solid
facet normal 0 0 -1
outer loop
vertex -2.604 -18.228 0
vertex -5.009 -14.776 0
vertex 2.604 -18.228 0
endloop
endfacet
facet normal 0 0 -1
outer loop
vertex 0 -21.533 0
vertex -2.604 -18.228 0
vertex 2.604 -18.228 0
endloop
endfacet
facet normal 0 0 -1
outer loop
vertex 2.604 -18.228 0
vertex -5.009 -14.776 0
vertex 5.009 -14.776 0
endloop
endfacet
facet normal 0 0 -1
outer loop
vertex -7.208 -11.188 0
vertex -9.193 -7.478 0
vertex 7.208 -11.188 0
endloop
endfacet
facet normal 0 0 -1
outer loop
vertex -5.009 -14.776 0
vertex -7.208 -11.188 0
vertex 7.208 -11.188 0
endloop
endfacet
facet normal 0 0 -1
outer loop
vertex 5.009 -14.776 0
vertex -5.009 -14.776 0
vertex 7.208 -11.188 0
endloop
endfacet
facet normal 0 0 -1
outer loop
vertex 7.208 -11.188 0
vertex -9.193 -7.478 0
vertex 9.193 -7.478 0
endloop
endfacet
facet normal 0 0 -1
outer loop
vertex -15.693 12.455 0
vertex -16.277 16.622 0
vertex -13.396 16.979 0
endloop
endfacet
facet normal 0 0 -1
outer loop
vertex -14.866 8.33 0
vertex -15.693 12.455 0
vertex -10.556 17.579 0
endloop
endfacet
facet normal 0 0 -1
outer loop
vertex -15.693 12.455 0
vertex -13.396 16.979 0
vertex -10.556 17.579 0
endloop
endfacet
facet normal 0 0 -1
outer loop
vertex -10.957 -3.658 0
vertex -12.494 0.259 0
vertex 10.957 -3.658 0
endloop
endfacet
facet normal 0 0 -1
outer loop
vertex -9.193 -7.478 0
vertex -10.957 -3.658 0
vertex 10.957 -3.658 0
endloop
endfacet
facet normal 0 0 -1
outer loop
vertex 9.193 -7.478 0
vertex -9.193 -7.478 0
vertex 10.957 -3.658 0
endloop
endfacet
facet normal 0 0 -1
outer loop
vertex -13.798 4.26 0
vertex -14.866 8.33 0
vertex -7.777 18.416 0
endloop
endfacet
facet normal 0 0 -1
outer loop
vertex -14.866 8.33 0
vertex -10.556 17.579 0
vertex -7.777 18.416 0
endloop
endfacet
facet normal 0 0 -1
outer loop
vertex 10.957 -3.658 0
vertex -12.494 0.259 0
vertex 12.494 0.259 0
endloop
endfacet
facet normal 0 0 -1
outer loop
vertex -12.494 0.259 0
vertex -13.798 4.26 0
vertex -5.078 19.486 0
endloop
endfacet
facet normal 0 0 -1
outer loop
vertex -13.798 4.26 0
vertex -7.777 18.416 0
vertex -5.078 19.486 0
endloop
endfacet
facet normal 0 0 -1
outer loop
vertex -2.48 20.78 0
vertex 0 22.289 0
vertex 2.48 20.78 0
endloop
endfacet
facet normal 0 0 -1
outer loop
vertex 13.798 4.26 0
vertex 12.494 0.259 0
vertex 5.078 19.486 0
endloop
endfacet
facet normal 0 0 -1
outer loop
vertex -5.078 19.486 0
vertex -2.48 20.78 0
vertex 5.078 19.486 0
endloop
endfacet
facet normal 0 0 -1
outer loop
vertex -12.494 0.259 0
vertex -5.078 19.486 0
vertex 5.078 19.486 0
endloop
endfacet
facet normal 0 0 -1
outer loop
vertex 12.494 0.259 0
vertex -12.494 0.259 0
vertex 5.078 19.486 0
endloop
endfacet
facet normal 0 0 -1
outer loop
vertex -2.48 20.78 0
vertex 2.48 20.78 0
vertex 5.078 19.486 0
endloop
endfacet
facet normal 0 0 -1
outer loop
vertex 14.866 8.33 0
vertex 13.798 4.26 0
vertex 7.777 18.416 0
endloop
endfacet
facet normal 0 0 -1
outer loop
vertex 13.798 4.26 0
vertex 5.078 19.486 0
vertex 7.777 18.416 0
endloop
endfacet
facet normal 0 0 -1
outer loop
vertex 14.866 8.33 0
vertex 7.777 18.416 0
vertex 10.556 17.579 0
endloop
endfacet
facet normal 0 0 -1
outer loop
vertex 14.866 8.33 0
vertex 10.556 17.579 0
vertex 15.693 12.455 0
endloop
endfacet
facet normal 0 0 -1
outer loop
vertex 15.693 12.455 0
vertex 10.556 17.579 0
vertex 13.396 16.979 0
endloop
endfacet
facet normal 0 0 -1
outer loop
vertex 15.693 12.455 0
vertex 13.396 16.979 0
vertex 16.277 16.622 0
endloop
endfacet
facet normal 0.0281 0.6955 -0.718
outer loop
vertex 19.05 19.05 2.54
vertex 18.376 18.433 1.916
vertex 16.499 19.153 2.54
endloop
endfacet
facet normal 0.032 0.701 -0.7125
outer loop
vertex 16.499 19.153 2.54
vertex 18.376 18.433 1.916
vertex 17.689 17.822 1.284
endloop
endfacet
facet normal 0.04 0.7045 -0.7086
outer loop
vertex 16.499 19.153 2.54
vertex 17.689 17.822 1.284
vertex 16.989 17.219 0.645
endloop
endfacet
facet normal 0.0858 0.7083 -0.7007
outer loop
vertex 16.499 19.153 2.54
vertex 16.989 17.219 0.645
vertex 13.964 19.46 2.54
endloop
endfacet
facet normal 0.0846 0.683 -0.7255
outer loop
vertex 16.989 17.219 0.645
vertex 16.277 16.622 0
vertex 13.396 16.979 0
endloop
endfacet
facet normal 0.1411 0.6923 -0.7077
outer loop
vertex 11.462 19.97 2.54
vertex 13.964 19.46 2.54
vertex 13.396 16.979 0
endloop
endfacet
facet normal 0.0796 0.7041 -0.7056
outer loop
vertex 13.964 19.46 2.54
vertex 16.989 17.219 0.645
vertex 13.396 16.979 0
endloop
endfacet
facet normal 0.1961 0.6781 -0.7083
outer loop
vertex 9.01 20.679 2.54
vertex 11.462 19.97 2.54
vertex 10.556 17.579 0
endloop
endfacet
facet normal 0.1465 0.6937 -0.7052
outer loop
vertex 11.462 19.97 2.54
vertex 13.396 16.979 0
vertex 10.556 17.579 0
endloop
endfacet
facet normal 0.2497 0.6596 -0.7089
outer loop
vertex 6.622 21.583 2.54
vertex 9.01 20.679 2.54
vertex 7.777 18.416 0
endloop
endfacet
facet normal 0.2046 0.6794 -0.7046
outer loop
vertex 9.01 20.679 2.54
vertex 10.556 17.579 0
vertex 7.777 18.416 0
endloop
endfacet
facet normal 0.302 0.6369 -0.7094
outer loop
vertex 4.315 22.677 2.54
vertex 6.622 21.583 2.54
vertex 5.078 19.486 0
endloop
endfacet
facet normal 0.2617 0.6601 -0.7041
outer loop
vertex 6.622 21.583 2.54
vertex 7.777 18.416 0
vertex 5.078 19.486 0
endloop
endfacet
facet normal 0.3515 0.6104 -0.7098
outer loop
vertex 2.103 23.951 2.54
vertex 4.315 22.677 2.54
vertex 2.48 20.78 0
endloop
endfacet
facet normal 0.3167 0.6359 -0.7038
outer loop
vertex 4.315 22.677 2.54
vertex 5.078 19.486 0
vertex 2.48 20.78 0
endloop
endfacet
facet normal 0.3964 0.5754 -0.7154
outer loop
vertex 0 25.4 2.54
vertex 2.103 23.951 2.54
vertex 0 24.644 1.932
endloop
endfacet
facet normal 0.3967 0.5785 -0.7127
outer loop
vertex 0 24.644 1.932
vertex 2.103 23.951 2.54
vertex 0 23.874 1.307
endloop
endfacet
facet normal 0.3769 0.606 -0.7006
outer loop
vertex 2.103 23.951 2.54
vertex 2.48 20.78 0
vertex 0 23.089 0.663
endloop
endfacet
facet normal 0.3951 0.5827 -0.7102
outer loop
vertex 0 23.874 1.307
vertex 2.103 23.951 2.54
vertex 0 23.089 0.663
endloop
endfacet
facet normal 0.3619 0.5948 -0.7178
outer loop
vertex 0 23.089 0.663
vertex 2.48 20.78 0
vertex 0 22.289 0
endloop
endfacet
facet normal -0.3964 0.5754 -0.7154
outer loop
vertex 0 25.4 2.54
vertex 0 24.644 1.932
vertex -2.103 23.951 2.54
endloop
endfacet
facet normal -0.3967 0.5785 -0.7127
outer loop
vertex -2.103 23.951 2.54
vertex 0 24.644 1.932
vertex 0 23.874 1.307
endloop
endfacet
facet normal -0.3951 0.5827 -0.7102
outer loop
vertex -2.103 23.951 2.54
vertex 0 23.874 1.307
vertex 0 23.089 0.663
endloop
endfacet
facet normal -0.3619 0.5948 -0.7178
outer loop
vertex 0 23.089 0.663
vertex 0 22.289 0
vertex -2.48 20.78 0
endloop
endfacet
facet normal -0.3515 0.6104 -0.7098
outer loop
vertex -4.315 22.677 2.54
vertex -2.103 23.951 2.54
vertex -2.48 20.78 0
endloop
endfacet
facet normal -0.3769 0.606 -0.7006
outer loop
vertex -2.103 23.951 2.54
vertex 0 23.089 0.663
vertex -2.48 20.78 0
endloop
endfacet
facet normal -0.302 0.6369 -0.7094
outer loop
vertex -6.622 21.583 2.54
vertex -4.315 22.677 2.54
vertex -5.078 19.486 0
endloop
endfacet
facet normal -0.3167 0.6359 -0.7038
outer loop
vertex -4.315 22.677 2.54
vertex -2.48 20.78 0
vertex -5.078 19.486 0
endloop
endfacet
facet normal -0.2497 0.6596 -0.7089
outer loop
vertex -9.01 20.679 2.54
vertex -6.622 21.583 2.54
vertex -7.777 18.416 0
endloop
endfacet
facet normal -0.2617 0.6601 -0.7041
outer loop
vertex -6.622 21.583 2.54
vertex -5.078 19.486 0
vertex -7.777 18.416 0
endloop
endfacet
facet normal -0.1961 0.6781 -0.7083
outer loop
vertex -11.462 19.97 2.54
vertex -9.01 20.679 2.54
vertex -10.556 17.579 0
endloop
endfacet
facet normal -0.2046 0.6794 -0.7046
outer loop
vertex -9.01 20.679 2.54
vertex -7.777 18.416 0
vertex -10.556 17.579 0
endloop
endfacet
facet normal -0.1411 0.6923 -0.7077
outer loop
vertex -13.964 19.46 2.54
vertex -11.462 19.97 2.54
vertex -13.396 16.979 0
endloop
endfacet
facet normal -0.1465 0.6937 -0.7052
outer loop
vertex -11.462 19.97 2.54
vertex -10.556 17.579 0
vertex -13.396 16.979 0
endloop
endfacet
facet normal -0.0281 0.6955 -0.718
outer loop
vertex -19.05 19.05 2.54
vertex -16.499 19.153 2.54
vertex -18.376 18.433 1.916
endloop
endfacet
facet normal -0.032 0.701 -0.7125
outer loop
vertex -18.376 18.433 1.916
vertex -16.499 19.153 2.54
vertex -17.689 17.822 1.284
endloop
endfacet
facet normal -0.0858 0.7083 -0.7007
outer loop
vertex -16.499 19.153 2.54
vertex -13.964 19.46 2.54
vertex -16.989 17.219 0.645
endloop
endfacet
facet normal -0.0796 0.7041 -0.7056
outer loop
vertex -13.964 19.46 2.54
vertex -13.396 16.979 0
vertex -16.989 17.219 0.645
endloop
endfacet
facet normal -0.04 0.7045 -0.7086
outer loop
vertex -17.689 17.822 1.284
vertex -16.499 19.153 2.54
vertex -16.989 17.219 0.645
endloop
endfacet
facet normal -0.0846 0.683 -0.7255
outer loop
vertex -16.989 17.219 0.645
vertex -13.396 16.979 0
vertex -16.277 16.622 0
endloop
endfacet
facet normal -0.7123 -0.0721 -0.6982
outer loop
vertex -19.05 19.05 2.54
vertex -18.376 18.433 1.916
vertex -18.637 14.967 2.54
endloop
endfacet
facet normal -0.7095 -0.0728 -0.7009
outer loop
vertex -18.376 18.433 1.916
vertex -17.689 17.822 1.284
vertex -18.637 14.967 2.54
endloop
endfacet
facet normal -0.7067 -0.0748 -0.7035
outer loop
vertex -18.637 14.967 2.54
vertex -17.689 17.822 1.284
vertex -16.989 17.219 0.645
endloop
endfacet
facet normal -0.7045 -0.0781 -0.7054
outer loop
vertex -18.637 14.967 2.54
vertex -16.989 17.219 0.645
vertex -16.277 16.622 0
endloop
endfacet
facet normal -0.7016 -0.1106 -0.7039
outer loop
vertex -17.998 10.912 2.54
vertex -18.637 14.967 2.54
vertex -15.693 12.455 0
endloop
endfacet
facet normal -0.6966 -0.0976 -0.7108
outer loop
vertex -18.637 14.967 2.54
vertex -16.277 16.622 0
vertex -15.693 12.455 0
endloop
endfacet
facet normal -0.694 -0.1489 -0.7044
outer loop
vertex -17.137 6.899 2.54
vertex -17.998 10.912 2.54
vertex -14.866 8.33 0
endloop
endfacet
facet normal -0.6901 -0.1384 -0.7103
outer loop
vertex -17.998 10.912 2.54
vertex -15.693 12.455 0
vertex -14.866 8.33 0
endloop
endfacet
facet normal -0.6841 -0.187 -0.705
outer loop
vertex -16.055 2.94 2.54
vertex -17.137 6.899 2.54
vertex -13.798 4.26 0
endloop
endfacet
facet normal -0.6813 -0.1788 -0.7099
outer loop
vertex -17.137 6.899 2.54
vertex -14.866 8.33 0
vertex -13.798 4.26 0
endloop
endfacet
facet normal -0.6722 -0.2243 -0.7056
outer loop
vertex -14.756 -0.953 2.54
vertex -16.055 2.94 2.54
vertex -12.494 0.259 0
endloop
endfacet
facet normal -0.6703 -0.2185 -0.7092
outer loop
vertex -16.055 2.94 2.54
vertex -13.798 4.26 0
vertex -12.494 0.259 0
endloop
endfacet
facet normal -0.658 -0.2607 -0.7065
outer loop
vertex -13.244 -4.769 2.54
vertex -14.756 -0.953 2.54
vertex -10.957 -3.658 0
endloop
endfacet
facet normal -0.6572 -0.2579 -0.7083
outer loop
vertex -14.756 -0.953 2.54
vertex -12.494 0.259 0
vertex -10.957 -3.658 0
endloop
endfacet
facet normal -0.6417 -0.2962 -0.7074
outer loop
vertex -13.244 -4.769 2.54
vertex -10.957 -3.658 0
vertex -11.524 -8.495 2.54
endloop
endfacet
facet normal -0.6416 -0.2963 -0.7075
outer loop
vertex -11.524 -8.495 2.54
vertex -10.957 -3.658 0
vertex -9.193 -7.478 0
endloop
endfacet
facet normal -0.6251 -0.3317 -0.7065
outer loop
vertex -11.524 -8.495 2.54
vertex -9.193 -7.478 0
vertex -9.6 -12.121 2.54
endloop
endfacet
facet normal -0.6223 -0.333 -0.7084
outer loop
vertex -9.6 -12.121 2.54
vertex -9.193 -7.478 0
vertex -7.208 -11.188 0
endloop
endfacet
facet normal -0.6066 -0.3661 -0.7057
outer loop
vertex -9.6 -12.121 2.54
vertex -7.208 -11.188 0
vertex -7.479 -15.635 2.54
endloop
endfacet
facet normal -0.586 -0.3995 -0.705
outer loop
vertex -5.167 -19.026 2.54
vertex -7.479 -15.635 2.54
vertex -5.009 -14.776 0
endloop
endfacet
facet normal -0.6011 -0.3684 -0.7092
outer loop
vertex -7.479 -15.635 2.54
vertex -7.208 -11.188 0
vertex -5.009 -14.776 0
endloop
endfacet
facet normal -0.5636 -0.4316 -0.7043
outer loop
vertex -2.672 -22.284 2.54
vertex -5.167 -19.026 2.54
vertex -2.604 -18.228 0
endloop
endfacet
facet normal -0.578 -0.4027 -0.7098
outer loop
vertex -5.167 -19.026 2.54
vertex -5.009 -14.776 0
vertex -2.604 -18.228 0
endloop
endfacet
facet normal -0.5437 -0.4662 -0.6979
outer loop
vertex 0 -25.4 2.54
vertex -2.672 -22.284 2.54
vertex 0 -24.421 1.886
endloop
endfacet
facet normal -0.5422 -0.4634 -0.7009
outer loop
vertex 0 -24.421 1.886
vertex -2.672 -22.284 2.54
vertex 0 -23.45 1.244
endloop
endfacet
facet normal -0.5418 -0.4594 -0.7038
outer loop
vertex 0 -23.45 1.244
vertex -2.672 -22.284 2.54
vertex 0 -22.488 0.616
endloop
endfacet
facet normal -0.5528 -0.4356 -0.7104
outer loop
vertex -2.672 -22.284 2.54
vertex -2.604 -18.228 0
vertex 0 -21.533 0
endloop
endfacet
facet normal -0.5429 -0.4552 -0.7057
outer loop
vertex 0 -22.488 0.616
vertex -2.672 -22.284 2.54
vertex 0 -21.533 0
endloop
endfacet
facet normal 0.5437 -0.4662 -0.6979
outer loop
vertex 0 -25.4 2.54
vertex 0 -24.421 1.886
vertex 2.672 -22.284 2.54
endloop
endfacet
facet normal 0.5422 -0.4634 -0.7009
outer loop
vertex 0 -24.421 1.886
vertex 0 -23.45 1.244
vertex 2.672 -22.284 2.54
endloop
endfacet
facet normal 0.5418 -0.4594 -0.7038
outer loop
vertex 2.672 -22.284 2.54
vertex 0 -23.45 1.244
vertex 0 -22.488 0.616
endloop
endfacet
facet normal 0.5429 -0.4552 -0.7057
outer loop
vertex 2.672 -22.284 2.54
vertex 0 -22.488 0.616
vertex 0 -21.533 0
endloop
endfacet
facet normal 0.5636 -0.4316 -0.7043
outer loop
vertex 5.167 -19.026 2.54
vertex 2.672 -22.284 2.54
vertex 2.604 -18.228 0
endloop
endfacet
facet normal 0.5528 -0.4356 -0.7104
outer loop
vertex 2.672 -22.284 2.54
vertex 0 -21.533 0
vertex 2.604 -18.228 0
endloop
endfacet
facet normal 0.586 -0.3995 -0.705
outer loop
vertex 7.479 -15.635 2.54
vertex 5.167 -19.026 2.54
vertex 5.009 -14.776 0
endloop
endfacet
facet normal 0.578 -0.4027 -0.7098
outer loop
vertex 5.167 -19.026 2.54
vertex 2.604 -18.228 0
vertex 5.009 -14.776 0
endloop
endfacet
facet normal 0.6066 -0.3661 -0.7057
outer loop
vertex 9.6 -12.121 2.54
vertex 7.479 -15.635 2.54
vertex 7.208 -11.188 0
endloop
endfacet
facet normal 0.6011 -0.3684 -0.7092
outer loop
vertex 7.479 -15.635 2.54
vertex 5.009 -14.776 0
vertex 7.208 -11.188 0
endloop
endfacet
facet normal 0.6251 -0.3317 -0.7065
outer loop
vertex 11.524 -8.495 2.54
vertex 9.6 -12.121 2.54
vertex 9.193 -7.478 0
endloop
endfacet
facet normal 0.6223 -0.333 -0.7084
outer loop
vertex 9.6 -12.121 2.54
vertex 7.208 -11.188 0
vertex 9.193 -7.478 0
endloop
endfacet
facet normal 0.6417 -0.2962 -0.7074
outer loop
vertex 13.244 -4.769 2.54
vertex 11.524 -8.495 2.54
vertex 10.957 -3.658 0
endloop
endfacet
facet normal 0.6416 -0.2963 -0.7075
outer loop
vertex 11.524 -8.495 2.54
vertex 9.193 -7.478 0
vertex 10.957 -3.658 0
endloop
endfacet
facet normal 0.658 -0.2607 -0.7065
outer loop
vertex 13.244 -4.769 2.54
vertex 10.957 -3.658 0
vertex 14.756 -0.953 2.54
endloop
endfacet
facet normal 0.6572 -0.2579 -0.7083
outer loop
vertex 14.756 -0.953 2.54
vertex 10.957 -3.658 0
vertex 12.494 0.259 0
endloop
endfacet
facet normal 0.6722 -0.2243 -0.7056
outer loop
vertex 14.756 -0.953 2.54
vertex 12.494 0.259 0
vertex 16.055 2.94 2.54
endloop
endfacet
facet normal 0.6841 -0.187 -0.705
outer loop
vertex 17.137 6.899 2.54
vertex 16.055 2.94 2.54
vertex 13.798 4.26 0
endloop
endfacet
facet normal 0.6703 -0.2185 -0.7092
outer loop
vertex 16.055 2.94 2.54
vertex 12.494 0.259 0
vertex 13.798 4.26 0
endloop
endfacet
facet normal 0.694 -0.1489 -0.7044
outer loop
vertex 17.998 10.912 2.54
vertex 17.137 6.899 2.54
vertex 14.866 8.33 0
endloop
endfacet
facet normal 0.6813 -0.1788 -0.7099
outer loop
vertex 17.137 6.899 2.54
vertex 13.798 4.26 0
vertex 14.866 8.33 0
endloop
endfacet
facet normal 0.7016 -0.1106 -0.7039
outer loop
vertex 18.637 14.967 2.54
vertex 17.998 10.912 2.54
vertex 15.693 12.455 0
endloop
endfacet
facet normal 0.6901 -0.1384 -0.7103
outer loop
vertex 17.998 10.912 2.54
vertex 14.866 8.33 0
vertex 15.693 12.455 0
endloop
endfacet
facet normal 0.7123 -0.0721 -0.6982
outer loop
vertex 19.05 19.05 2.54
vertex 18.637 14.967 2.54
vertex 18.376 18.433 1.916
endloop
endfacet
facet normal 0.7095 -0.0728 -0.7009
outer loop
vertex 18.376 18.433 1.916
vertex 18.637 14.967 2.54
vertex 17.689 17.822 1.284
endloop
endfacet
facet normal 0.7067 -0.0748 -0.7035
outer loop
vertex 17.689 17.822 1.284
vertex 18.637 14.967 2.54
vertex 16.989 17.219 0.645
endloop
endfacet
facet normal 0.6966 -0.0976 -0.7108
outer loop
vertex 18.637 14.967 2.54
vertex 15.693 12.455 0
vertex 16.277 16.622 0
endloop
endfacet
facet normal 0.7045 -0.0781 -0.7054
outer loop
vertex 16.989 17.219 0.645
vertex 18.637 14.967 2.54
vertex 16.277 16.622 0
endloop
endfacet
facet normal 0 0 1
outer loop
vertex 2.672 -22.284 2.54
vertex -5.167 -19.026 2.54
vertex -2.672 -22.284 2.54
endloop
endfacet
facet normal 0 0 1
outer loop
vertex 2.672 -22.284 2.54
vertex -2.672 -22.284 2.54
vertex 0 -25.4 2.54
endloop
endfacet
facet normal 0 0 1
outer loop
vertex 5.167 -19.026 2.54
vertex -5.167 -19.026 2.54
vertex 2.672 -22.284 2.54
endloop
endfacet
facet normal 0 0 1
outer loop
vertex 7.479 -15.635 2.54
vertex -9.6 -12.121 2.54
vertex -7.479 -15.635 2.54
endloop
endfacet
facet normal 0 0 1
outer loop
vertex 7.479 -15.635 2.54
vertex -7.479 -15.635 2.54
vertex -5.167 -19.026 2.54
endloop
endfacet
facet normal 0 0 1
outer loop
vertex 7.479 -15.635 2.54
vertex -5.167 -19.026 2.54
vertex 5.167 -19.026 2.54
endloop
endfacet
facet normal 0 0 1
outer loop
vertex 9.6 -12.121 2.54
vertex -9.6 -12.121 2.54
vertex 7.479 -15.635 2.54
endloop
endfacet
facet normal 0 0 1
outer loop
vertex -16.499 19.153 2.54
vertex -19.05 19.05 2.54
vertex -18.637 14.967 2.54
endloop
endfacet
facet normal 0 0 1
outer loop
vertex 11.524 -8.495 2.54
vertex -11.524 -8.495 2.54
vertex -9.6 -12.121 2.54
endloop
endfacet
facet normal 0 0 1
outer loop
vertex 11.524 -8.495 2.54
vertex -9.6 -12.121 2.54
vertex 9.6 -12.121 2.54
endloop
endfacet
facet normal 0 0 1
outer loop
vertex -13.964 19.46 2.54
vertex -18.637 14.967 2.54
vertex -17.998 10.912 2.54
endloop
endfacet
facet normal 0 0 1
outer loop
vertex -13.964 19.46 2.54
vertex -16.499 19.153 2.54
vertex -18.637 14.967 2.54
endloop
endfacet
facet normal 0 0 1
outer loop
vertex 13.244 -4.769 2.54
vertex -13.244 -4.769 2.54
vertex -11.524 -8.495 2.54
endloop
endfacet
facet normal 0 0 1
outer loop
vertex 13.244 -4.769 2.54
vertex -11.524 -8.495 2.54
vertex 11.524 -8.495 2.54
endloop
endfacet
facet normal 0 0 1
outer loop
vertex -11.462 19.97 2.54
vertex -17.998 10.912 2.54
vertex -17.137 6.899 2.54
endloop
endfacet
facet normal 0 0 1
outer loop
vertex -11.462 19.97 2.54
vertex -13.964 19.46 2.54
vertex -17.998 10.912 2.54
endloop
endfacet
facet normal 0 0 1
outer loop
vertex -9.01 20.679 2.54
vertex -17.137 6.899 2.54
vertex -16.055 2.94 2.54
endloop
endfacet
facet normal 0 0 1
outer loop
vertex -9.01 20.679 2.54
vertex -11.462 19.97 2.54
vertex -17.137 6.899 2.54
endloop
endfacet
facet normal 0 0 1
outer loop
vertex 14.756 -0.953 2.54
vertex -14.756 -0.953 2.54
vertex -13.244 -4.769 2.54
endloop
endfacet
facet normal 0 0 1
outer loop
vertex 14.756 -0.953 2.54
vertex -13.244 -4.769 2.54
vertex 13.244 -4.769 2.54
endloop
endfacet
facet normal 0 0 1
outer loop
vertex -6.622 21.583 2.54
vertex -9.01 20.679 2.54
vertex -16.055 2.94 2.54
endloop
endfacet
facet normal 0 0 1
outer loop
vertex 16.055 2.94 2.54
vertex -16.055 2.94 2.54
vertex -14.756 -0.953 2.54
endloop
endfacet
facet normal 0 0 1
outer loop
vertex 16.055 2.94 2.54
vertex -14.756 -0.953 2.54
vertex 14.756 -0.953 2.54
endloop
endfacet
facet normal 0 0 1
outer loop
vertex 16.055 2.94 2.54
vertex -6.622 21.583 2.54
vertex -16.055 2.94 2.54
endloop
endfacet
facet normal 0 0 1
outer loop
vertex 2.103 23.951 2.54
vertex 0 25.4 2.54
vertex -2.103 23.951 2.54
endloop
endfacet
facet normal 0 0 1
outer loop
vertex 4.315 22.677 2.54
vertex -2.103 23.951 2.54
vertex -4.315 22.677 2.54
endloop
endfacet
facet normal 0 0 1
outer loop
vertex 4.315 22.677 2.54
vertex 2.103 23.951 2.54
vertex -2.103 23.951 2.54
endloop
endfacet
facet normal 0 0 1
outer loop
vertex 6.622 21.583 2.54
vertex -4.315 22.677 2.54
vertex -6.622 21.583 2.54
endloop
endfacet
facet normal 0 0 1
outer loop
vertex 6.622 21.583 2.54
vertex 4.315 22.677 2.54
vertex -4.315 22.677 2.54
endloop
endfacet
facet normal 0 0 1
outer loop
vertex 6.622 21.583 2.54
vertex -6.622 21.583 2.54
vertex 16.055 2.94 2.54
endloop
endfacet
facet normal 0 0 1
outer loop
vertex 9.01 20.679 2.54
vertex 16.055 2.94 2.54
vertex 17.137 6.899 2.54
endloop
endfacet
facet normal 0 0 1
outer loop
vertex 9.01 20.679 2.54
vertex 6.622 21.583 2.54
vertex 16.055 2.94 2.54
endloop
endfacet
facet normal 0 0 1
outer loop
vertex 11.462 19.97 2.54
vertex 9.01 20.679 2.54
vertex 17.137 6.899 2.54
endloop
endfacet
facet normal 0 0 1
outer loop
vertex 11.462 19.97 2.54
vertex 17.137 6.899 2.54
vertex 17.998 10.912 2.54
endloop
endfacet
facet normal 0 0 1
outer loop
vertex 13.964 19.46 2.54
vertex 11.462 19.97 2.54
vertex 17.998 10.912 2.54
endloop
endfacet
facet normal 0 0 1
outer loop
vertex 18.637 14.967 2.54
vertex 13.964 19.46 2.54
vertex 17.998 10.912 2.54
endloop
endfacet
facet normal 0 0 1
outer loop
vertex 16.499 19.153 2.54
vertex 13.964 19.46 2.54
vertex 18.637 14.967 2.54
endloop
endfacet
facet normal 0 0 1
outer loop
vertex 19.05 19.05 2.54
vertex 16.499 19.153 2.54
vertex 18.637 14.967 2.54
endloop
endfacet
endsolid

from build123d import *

# Parameters (mm, degrees)
F1_DEPTH = 2.54
F2_SIZE  = 2.53999


# Not quite as in the source:
# - a fillet or chamfer is up to 0.001 mm smaller than in the source, because OpenCascade refuses the exact size


with BuildPart() as f1:
    # F0 (on Top) → F1 (new body)
    with BuildSketch(Plane.XY):
        with BuildLine():
            ThreePointArc((0, 25.4), (-9.009768429, 20.6793052869), (-19.05, 19.05))
            ThreePointArc((-19.05, 19.05), (-13.2442322719, -4.768956688), (0, -25.4))
            ThreePointArc((0, -25.4), (13.2442322719, -4.768956688), (19.05, 19.05))
            ThreePointArc((19.05, 19.05), (9.009768429, 20.6793052869), (0, 25.4))
        make_face()
    extrude(amount=F1_DEPTH)

    # F2 (size 2.54 in the source; OpenCascade refuses exactly that, so slightly less here)
    f2_edges = [f1.edges().sort_by_distance(p)[0] for p in [
        (13.244232, -4.768957, 0),
        (-13.244232, -4.768957, 0),
        (-9.009768, 20.679305, 0),
        (9.009768, 20.679305, 0),
    ]]
    chamfer(f2_edges, length=F2_SIZE)


solid = f1.part
